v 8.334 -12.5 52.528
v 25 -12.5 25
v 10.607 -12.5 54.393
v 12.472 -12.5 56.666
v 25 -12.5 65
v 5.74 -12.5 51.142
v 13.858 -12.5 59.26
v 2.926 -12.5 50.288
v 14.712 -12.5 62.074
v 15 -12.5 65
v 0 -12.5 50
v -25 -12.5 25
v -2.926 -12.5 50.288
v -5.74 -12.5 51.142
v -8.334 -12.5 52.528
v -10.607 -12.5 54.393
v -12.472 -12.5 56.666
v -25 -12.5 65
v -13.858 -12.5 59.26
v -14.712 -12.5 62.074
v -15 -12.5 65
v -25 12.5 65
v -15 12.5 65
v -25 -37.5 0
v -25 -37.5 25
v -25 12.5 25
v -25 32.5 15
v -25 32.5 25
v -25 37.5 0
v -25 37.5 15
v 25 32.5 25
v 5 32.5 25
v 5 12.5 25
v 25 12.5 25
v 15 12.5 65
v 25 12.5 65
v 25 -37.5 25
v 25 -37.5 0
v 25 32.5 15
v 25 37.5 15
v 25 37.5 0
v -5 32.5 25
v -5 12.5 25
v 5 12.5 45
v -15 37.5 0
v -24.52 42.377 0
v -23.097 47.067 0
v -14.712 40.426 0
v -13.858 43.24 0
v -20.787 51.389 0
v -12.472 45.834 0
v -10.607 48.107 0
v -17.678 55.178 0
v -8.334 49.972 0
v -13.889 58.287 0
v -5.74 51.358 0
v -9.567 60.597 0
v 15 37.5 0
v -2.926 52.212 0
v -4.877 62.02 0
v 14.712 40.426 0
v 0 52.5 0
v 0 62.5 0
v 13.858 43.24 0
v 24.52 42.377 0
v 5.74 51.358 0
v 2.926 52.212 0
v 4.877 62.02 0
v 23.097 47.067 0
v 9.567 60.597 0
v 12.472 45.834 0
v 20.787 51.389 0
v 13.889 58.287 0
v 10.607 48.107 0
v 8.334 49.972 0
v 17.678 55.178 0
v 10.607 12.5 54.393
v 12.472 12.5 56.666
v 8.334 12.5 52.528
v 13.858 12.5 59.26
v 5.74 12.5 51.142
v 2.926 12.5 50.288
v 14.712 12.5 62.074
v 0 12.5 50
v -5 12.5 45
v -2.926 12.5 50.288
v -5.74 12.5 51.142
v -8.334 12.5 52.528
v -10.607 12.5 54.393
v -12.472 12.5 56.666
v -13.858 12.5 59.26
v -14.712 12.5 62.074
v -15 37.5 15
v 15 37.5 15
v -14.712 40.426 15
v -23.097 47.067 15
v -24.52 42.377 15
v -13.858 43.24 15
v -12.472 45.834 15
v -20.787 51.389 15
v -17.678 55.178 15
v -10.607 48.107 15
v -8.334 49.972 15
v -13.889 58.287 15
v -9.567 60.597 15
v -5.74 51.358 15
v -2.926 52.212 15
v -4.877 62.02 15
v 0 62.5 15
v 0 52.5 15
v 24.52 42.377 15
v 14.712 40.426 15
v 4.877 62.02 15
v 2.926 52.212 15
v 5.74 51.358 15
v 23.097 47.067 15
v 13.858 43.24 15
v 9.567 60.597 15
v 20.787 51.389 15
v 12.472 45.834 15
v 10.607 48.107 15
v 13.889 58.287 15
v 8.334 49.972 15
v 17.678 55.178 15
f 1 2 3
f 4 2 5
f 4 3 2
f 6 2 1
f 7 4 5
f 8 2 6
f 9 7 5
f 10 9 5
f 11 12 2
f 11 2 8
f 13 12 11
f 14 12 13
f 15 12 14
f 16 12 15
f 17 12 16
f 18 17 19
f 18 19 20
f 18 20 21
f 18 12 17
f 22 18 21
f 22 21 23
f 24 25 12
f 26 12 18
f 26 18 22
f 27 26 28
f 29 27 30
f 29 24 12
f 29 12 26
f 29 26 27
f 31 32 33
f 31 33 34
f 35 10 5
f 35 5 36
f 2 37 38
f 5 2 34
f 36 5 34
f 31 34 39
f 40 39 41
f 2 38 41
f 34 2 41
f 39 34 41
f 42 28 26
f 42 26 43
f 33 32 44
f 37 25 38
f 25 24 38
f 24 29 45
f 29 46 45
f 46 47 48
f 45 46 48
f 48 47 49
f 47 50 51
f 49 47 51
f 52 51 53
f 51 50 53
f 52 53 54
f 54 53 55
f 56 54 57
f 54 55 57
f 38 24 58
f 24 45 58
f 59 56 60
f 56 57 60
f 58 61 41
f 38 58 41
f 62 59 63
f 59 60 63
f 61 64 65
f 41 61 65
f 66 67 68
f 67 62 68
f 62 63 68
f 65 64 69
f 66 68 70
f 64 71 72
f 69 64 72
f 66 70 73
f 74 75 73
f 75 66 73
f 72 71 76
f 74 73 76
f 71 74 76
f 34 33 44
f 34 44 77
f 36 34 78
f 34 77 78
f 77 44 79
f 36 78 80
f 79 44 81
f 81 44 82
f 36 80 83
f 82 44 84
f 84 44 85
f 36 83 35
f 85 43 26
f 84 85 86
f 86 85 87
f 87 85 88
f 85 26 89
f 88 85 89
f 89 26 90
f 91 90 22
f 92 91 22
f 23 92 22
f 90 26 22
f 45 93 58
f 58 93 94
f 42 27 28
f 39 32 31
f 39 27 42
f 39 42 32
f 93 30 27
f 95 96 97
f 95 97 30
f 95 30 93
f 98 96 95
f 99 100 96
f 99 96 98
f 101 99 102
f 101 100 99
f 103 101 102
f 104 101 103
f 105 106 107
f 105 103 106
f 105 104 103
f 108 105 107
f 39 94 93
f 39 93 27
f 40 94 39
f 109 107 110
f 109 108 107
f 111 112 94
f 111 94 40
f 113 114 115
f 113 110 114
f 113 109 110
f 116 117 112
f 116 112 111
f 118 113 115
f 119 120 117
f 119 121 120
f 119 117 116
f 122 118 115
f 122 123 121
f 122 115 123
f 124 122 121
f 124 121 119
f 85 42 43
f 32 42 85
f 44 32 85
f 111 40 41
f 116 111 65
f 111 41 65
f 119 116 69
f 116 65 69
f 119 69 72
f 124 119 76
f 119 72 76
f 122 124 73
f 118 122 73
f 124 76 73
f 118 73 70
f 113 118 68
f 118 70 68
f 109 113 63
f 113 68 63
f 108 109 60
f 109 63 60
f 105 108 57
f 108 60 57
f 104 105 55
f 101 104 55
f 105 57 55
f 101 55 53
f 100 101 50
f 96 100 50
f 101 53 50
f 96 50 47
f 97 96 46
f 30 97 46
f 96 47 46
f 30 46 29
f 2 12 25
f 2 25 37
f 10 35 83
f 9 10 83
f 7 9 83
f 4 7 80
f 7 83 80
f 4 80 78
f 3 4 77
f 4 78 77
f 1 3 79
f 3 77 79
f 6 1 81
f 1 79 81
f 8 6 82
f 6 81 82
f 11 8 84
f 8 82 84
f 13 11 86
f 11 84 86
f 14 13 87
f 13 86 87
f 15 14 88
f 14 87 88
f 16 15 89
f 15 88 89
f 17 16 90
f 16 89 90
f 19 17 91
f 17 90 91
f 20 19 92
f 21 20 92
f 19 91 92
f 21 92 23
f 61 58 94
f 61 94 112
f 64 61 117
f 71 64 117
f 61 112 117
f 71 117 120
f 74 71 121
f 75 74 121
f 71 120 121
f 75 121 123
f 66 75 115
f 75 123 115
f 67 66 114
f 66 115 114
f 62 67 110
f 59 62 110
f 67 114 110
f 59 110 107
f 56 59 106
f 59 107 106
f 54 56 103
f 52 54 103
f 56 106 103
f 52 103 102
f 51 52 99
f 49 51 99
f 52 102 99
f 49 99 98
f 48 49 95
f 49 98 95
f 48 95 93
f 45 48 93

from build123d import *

# Parameters (mm, degrees)
BOSS_EXTRUDE2_DEPTH = 15
CUT_EXTRUDE2_DEPTH  = 15
SKETCH5_W           = 50
SKETCH5_H           = 70
BOSS_EXTRUDE3_DEPTH = 10
SKETCH6_W           = 40
SKETCH6_H           = 25
BOSS_EXTRUDE4_DEPTH = 50
RIB1_REACH          = 95.575
SKETCH10_WALL_W     = 217.43394397
SKETCH10_WALL_H     = 10
SKETCH11_R          = 15
CUT_EXTRUDE3_DEPTH  = 25


with BuildPart() as part:
    # Sketch2 → Boss-Extrude2 (new body)
    with BuildSketch(Plane.XY):
        with BuildLine():
            Line((-25, 37.5), (-25, -37.5))
            Line((-25, -37.5), (25, -37.5))
            Line((25, -37.5), (25, 37.5))
            ThreePointArc((25, 37.5), (0, 62.5), (-25, 37.5))
        make_face()
    extrude(amount=BOSS_EXTRUDE2_DEPTH)

    # Sketch4 → Cut-Extrude2 (cut)
    with BuildSketch(Plane.XY.offset(15)):
        with BuildLine():
            Line((-15, 37.5), (15, 37.5))
            ThreePointArc((15, 37.5), (0, 52.5), (-15, 37.5))
        make_face()
    extrude(amount=-CUT_EXTRUDE2_DEPTH, mode=Mode.SUBTRACT)

    # Sketch5 → Boss-Extrude3 (add)
    with BuildSketch(Plane.XY.offset(15)):
        with Locations((0, -2.5)):
            Rectangle(SKETCH5_W, SKETCH5_H)
    extrude(amount=BOSS_EXTRUDE3_DEPTH)

    # Sketch6 → Boss-Extrude4 (add)
    with BuildSketch(Plane.ZY.offset(25)):
        with Locations((45, 0)):
            Rectangle(SKETCH6_W, SKETCH6_H)
    extrude(amount=-BOSS_EXTRUDE4_DEPTH)

    # Sketch10 wall → Rib1 (add, up to next)
    with BuildSketch(Plane(origin=(0, 22.5, 35), x_dir=(0, -0.707106781187, 0.707106781187), z_dir=(0, -0.707106781187, -0.707106781187)), mode=Mode.PRIVATE) as rib1_sk1:
        Rectangle(SKETCH10_WALL_W, SKETCH10_WALL_H)
    rib1_tool1 = extrude(rib1_sk1.sketch, amount=RIB1_REACH, mode=Mode.PRIVATE) - part.part
    add(rib1_tool1.solids().sort_by_distance((0, 22.5, 35))[0])

    # Sketch11 → Cut-Extrude3 (cut)
    with BuildSketch(Plane(origin=(0, 12.5, 0), x_dir=(1, 0, 0), z_dir=(0, 1, 0))):
        with Locations((0, -65)):
            Circle(SKETCH11_R)
    extrude(amount=-CUT_EXTRUDE3_DEPTH, mode=Mode.SUBTRACT)


solid = part.part
